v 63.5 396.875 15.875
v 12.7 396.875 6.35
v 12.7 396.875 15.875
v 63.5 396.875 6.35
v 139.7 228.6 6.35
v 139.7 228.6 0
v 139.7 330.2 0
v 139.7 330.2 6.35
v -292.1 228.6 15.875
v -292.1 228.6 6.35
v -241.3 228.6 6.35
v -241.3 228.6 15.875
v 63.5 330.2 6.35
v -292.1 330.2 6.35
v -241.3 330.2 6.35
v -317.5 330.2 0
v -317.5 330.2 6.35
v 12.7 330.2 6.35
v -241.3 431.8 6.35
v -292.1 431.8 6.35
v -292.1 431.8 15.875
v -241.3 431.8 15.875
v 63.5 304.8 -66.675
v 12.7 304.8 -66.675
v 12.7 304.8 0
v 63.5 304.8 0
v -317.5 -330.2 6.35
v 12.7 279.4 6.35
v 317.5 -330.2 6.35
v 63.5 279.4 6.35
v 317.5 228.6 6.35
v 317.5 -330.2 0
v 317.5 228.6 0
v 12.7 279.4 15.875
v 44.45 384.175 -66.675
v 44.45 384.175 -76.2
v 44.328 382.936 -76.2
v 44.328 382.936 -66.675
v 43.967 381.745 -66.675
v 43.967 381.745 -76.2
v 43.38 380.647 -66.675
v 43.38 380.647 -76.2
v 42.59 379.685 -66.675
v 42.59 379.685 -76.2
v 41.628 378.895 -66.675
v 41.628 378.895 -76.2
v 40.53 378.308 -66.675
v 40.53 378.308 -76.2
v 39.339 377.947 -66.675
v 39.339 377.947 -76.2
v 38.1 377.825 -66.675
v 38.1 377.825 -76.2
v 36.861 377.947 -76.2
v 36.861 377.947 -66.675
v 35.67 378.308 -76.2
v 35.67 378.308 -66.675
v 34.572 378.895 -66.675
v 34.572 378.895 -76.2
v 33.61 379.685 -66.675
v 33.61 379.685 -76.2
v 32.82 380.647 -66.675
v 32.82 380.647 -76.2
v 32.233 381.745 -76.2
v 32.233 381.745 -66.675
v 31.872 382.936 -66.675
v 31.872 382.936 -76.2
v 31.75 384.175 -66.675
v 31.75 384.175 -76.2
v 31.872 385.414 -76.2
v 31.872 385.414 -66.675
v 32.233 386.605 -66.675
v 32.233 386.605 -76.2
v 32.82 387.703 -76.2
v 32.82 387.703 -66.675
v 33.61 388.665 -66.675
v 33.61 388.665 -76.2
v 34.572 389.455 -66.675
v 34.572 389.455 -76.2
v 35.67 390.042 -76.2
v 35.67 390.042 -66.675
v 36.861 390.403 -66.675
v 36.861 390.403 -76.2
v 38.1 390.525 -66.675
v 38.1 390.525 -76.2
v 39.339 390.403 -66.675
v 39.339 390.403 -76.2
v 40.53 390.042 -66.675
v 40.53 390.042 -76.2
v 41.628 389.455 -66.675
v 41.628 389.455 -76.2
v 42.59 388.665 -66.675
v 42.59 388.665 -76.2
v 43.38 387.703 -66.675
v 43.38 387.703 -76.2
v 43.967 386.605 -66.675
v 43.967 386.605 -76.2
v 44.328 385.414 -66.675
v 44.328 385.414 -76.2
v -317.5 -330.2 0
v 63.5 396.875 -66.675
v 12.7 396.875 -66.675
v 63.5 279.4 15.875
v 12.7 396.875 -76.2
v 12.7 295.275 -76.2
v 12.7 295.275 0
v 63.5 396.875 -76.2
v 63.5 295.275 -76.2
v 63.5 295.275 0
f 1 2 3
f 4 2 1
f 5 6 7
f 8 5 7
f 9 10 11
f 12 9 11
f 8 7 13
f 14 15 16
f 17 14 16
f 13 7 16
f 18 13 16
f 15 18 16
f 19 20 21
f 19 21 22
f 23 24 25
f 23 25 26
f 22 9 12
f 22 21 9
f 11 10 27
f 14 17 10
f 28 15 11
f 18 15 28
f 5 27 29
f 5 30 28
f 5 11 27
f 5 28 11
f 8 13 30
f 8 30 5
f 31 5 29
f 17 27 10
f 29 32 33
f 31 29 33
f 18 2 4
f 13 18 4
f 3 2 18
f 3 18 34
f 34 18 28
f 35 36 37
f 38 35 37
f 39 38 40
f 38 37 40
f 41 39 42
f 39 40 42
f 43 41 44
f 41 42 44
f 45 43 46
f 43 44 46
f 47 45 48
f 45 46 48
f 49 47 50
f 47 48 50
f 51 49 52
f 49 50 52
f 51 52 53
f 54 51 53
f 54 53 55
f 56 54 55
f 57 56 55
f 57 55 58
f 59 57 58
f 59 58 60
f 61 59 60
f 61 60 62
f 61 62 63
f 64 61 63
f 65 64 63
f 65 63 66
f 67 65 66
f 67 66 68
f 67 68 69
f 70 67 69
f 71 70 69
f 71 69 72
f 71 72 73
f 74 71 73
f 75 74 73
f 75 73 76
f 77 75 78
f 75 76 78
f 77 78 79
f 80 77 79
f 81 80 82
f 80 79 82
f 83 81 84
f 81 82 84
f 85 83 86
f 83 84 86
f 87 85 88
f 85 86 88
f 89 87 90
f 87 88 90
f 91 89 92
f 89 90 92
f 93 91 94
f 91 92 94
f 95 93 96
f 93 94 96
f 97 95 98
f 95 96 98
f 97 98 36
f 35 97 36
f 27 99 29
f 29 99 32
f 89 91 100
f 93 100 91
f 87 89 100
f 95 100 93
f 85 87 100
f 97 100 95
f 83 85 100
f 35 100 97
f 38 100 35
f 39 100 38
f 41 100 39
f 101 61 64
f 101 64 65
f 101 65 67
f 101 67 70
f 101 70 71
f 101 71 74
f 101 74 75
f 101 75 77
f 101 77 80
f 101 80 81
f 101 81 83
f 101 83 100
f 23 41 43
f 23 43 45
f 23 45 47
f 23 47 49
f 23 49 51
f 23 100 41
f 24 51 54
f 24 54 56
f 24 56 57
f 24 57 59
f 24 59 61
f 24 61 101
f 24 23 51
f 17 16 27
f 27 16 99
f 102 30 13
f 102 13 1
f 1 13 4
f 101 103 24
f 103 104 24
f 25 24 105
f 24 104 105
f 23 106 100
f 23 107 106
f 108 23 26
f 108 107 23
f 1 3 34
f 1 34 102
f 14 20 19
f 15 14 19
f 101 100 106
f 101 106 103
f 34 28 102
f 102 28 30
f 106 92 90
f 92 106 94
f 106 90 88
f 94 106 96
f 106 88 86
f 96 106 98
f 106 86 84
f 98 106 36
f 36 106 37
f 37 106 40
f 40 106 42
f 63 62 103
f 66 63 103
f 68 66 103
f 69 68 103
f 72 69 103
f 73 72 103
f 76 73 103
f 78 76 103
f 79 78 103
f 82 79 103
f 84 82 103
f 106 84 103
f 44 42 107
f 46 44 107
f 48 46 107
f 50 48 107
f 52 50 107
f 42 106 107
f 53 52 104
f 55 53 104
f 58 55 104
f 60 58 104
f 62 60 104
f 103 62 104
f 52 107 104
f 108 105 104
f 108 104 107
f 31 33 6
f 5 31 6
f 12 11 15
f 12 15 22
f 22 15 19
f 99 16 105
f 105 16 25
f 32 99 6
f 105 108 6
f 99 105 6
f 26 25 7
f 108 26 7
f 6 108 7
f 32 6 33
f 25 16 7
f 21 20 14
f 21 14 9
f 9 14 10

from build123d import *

# Parameters (mm, degrees)
F1_DEPTH  = 6.35
F2_W      = 50.8
F2_H      = 101.6
F3_DEPTH  = 9.525
F4_W      = 50.8
F4_H      = 9.525
F5_DEPTH  = 76.2
F6_W      = 50.8
F6_H      = 9.525
F7_DEPTH  = 92.075
F8_R      = 6.35
F9_DEPTH  = 25.4
F10_W     = 50.8
F10_H     = 66.675
F10_H_2   = 50.8
F11_DEPTH = 9.525


with BuildPart() as f1:
    # F0 (on Top) → F1 (new body)
    with BuildSketch(Plane.XY):
        Polygon((-317.5, -330.2), (317.5, -330.2), (317.5, 228.6), (139.7, 228.6), (139.7, 330.2), (-317.5, 330.2), align=None)
    extrude(amount=F1_DEPTH)

    # F2 (on face) → F3 (join)
    with BuildSketch(Plane.XY.offset(6.35)):
        with Locations((-266.7, 279.4)):
            Rectangle(F2_W, F2_H)
        with Locations((-266.7, 381)):
            Rectangle(F2_W, F2_H)
    extrude(amount=F3_DEPTH)

    # F4 (on face) → F5 (join)
    with BuildSketch(Plane(origin=(0, 0, 0), x_dir=(1, 0, 0), z_dir=(0, 0, -1))):
        with Locations((38.1, -300.0375)):
            Rectangle(F4_W, F4_H)
    extrude(amount=F5_DEPTH)

    # F6 (on face) → F7 (join)
    with BuildSketch(Plane(origin=(0, 304.8, 0), x_dir=(-1, 0, 0), z_dir=(0, 1, 0))):
        with Locations((-38.1, -71.4375)):
            Rectangle(F6_W, F6_H)
    extrude(amount=F7_DEPTH)

    # F8 (on face) → F9 (cut)
    with BuildSketch(Plane(origin=(0, 0, -76.2), x_dir=(1, 0, 0), z_dir=(0, 0, -1))):
        with Locations((38.1, -384.175)):
            Circle(F8_R)
    extrude(amount=-F9_DEPTH, mode=Mode.SUBTRACT)

    # F10 (on face) → F11 (join)
    with BuildSketch(Plane.XY.offset(6.35)):
        with Locations((38.1, 363.5375)):
            Rectangle(F10_W, F10_H)
        with Locations((38.1, 304.8)):
            Rectangle(F10_W, F10_H_2)
    extrude(amount=F11_DEPTH)


solid = f1.part
